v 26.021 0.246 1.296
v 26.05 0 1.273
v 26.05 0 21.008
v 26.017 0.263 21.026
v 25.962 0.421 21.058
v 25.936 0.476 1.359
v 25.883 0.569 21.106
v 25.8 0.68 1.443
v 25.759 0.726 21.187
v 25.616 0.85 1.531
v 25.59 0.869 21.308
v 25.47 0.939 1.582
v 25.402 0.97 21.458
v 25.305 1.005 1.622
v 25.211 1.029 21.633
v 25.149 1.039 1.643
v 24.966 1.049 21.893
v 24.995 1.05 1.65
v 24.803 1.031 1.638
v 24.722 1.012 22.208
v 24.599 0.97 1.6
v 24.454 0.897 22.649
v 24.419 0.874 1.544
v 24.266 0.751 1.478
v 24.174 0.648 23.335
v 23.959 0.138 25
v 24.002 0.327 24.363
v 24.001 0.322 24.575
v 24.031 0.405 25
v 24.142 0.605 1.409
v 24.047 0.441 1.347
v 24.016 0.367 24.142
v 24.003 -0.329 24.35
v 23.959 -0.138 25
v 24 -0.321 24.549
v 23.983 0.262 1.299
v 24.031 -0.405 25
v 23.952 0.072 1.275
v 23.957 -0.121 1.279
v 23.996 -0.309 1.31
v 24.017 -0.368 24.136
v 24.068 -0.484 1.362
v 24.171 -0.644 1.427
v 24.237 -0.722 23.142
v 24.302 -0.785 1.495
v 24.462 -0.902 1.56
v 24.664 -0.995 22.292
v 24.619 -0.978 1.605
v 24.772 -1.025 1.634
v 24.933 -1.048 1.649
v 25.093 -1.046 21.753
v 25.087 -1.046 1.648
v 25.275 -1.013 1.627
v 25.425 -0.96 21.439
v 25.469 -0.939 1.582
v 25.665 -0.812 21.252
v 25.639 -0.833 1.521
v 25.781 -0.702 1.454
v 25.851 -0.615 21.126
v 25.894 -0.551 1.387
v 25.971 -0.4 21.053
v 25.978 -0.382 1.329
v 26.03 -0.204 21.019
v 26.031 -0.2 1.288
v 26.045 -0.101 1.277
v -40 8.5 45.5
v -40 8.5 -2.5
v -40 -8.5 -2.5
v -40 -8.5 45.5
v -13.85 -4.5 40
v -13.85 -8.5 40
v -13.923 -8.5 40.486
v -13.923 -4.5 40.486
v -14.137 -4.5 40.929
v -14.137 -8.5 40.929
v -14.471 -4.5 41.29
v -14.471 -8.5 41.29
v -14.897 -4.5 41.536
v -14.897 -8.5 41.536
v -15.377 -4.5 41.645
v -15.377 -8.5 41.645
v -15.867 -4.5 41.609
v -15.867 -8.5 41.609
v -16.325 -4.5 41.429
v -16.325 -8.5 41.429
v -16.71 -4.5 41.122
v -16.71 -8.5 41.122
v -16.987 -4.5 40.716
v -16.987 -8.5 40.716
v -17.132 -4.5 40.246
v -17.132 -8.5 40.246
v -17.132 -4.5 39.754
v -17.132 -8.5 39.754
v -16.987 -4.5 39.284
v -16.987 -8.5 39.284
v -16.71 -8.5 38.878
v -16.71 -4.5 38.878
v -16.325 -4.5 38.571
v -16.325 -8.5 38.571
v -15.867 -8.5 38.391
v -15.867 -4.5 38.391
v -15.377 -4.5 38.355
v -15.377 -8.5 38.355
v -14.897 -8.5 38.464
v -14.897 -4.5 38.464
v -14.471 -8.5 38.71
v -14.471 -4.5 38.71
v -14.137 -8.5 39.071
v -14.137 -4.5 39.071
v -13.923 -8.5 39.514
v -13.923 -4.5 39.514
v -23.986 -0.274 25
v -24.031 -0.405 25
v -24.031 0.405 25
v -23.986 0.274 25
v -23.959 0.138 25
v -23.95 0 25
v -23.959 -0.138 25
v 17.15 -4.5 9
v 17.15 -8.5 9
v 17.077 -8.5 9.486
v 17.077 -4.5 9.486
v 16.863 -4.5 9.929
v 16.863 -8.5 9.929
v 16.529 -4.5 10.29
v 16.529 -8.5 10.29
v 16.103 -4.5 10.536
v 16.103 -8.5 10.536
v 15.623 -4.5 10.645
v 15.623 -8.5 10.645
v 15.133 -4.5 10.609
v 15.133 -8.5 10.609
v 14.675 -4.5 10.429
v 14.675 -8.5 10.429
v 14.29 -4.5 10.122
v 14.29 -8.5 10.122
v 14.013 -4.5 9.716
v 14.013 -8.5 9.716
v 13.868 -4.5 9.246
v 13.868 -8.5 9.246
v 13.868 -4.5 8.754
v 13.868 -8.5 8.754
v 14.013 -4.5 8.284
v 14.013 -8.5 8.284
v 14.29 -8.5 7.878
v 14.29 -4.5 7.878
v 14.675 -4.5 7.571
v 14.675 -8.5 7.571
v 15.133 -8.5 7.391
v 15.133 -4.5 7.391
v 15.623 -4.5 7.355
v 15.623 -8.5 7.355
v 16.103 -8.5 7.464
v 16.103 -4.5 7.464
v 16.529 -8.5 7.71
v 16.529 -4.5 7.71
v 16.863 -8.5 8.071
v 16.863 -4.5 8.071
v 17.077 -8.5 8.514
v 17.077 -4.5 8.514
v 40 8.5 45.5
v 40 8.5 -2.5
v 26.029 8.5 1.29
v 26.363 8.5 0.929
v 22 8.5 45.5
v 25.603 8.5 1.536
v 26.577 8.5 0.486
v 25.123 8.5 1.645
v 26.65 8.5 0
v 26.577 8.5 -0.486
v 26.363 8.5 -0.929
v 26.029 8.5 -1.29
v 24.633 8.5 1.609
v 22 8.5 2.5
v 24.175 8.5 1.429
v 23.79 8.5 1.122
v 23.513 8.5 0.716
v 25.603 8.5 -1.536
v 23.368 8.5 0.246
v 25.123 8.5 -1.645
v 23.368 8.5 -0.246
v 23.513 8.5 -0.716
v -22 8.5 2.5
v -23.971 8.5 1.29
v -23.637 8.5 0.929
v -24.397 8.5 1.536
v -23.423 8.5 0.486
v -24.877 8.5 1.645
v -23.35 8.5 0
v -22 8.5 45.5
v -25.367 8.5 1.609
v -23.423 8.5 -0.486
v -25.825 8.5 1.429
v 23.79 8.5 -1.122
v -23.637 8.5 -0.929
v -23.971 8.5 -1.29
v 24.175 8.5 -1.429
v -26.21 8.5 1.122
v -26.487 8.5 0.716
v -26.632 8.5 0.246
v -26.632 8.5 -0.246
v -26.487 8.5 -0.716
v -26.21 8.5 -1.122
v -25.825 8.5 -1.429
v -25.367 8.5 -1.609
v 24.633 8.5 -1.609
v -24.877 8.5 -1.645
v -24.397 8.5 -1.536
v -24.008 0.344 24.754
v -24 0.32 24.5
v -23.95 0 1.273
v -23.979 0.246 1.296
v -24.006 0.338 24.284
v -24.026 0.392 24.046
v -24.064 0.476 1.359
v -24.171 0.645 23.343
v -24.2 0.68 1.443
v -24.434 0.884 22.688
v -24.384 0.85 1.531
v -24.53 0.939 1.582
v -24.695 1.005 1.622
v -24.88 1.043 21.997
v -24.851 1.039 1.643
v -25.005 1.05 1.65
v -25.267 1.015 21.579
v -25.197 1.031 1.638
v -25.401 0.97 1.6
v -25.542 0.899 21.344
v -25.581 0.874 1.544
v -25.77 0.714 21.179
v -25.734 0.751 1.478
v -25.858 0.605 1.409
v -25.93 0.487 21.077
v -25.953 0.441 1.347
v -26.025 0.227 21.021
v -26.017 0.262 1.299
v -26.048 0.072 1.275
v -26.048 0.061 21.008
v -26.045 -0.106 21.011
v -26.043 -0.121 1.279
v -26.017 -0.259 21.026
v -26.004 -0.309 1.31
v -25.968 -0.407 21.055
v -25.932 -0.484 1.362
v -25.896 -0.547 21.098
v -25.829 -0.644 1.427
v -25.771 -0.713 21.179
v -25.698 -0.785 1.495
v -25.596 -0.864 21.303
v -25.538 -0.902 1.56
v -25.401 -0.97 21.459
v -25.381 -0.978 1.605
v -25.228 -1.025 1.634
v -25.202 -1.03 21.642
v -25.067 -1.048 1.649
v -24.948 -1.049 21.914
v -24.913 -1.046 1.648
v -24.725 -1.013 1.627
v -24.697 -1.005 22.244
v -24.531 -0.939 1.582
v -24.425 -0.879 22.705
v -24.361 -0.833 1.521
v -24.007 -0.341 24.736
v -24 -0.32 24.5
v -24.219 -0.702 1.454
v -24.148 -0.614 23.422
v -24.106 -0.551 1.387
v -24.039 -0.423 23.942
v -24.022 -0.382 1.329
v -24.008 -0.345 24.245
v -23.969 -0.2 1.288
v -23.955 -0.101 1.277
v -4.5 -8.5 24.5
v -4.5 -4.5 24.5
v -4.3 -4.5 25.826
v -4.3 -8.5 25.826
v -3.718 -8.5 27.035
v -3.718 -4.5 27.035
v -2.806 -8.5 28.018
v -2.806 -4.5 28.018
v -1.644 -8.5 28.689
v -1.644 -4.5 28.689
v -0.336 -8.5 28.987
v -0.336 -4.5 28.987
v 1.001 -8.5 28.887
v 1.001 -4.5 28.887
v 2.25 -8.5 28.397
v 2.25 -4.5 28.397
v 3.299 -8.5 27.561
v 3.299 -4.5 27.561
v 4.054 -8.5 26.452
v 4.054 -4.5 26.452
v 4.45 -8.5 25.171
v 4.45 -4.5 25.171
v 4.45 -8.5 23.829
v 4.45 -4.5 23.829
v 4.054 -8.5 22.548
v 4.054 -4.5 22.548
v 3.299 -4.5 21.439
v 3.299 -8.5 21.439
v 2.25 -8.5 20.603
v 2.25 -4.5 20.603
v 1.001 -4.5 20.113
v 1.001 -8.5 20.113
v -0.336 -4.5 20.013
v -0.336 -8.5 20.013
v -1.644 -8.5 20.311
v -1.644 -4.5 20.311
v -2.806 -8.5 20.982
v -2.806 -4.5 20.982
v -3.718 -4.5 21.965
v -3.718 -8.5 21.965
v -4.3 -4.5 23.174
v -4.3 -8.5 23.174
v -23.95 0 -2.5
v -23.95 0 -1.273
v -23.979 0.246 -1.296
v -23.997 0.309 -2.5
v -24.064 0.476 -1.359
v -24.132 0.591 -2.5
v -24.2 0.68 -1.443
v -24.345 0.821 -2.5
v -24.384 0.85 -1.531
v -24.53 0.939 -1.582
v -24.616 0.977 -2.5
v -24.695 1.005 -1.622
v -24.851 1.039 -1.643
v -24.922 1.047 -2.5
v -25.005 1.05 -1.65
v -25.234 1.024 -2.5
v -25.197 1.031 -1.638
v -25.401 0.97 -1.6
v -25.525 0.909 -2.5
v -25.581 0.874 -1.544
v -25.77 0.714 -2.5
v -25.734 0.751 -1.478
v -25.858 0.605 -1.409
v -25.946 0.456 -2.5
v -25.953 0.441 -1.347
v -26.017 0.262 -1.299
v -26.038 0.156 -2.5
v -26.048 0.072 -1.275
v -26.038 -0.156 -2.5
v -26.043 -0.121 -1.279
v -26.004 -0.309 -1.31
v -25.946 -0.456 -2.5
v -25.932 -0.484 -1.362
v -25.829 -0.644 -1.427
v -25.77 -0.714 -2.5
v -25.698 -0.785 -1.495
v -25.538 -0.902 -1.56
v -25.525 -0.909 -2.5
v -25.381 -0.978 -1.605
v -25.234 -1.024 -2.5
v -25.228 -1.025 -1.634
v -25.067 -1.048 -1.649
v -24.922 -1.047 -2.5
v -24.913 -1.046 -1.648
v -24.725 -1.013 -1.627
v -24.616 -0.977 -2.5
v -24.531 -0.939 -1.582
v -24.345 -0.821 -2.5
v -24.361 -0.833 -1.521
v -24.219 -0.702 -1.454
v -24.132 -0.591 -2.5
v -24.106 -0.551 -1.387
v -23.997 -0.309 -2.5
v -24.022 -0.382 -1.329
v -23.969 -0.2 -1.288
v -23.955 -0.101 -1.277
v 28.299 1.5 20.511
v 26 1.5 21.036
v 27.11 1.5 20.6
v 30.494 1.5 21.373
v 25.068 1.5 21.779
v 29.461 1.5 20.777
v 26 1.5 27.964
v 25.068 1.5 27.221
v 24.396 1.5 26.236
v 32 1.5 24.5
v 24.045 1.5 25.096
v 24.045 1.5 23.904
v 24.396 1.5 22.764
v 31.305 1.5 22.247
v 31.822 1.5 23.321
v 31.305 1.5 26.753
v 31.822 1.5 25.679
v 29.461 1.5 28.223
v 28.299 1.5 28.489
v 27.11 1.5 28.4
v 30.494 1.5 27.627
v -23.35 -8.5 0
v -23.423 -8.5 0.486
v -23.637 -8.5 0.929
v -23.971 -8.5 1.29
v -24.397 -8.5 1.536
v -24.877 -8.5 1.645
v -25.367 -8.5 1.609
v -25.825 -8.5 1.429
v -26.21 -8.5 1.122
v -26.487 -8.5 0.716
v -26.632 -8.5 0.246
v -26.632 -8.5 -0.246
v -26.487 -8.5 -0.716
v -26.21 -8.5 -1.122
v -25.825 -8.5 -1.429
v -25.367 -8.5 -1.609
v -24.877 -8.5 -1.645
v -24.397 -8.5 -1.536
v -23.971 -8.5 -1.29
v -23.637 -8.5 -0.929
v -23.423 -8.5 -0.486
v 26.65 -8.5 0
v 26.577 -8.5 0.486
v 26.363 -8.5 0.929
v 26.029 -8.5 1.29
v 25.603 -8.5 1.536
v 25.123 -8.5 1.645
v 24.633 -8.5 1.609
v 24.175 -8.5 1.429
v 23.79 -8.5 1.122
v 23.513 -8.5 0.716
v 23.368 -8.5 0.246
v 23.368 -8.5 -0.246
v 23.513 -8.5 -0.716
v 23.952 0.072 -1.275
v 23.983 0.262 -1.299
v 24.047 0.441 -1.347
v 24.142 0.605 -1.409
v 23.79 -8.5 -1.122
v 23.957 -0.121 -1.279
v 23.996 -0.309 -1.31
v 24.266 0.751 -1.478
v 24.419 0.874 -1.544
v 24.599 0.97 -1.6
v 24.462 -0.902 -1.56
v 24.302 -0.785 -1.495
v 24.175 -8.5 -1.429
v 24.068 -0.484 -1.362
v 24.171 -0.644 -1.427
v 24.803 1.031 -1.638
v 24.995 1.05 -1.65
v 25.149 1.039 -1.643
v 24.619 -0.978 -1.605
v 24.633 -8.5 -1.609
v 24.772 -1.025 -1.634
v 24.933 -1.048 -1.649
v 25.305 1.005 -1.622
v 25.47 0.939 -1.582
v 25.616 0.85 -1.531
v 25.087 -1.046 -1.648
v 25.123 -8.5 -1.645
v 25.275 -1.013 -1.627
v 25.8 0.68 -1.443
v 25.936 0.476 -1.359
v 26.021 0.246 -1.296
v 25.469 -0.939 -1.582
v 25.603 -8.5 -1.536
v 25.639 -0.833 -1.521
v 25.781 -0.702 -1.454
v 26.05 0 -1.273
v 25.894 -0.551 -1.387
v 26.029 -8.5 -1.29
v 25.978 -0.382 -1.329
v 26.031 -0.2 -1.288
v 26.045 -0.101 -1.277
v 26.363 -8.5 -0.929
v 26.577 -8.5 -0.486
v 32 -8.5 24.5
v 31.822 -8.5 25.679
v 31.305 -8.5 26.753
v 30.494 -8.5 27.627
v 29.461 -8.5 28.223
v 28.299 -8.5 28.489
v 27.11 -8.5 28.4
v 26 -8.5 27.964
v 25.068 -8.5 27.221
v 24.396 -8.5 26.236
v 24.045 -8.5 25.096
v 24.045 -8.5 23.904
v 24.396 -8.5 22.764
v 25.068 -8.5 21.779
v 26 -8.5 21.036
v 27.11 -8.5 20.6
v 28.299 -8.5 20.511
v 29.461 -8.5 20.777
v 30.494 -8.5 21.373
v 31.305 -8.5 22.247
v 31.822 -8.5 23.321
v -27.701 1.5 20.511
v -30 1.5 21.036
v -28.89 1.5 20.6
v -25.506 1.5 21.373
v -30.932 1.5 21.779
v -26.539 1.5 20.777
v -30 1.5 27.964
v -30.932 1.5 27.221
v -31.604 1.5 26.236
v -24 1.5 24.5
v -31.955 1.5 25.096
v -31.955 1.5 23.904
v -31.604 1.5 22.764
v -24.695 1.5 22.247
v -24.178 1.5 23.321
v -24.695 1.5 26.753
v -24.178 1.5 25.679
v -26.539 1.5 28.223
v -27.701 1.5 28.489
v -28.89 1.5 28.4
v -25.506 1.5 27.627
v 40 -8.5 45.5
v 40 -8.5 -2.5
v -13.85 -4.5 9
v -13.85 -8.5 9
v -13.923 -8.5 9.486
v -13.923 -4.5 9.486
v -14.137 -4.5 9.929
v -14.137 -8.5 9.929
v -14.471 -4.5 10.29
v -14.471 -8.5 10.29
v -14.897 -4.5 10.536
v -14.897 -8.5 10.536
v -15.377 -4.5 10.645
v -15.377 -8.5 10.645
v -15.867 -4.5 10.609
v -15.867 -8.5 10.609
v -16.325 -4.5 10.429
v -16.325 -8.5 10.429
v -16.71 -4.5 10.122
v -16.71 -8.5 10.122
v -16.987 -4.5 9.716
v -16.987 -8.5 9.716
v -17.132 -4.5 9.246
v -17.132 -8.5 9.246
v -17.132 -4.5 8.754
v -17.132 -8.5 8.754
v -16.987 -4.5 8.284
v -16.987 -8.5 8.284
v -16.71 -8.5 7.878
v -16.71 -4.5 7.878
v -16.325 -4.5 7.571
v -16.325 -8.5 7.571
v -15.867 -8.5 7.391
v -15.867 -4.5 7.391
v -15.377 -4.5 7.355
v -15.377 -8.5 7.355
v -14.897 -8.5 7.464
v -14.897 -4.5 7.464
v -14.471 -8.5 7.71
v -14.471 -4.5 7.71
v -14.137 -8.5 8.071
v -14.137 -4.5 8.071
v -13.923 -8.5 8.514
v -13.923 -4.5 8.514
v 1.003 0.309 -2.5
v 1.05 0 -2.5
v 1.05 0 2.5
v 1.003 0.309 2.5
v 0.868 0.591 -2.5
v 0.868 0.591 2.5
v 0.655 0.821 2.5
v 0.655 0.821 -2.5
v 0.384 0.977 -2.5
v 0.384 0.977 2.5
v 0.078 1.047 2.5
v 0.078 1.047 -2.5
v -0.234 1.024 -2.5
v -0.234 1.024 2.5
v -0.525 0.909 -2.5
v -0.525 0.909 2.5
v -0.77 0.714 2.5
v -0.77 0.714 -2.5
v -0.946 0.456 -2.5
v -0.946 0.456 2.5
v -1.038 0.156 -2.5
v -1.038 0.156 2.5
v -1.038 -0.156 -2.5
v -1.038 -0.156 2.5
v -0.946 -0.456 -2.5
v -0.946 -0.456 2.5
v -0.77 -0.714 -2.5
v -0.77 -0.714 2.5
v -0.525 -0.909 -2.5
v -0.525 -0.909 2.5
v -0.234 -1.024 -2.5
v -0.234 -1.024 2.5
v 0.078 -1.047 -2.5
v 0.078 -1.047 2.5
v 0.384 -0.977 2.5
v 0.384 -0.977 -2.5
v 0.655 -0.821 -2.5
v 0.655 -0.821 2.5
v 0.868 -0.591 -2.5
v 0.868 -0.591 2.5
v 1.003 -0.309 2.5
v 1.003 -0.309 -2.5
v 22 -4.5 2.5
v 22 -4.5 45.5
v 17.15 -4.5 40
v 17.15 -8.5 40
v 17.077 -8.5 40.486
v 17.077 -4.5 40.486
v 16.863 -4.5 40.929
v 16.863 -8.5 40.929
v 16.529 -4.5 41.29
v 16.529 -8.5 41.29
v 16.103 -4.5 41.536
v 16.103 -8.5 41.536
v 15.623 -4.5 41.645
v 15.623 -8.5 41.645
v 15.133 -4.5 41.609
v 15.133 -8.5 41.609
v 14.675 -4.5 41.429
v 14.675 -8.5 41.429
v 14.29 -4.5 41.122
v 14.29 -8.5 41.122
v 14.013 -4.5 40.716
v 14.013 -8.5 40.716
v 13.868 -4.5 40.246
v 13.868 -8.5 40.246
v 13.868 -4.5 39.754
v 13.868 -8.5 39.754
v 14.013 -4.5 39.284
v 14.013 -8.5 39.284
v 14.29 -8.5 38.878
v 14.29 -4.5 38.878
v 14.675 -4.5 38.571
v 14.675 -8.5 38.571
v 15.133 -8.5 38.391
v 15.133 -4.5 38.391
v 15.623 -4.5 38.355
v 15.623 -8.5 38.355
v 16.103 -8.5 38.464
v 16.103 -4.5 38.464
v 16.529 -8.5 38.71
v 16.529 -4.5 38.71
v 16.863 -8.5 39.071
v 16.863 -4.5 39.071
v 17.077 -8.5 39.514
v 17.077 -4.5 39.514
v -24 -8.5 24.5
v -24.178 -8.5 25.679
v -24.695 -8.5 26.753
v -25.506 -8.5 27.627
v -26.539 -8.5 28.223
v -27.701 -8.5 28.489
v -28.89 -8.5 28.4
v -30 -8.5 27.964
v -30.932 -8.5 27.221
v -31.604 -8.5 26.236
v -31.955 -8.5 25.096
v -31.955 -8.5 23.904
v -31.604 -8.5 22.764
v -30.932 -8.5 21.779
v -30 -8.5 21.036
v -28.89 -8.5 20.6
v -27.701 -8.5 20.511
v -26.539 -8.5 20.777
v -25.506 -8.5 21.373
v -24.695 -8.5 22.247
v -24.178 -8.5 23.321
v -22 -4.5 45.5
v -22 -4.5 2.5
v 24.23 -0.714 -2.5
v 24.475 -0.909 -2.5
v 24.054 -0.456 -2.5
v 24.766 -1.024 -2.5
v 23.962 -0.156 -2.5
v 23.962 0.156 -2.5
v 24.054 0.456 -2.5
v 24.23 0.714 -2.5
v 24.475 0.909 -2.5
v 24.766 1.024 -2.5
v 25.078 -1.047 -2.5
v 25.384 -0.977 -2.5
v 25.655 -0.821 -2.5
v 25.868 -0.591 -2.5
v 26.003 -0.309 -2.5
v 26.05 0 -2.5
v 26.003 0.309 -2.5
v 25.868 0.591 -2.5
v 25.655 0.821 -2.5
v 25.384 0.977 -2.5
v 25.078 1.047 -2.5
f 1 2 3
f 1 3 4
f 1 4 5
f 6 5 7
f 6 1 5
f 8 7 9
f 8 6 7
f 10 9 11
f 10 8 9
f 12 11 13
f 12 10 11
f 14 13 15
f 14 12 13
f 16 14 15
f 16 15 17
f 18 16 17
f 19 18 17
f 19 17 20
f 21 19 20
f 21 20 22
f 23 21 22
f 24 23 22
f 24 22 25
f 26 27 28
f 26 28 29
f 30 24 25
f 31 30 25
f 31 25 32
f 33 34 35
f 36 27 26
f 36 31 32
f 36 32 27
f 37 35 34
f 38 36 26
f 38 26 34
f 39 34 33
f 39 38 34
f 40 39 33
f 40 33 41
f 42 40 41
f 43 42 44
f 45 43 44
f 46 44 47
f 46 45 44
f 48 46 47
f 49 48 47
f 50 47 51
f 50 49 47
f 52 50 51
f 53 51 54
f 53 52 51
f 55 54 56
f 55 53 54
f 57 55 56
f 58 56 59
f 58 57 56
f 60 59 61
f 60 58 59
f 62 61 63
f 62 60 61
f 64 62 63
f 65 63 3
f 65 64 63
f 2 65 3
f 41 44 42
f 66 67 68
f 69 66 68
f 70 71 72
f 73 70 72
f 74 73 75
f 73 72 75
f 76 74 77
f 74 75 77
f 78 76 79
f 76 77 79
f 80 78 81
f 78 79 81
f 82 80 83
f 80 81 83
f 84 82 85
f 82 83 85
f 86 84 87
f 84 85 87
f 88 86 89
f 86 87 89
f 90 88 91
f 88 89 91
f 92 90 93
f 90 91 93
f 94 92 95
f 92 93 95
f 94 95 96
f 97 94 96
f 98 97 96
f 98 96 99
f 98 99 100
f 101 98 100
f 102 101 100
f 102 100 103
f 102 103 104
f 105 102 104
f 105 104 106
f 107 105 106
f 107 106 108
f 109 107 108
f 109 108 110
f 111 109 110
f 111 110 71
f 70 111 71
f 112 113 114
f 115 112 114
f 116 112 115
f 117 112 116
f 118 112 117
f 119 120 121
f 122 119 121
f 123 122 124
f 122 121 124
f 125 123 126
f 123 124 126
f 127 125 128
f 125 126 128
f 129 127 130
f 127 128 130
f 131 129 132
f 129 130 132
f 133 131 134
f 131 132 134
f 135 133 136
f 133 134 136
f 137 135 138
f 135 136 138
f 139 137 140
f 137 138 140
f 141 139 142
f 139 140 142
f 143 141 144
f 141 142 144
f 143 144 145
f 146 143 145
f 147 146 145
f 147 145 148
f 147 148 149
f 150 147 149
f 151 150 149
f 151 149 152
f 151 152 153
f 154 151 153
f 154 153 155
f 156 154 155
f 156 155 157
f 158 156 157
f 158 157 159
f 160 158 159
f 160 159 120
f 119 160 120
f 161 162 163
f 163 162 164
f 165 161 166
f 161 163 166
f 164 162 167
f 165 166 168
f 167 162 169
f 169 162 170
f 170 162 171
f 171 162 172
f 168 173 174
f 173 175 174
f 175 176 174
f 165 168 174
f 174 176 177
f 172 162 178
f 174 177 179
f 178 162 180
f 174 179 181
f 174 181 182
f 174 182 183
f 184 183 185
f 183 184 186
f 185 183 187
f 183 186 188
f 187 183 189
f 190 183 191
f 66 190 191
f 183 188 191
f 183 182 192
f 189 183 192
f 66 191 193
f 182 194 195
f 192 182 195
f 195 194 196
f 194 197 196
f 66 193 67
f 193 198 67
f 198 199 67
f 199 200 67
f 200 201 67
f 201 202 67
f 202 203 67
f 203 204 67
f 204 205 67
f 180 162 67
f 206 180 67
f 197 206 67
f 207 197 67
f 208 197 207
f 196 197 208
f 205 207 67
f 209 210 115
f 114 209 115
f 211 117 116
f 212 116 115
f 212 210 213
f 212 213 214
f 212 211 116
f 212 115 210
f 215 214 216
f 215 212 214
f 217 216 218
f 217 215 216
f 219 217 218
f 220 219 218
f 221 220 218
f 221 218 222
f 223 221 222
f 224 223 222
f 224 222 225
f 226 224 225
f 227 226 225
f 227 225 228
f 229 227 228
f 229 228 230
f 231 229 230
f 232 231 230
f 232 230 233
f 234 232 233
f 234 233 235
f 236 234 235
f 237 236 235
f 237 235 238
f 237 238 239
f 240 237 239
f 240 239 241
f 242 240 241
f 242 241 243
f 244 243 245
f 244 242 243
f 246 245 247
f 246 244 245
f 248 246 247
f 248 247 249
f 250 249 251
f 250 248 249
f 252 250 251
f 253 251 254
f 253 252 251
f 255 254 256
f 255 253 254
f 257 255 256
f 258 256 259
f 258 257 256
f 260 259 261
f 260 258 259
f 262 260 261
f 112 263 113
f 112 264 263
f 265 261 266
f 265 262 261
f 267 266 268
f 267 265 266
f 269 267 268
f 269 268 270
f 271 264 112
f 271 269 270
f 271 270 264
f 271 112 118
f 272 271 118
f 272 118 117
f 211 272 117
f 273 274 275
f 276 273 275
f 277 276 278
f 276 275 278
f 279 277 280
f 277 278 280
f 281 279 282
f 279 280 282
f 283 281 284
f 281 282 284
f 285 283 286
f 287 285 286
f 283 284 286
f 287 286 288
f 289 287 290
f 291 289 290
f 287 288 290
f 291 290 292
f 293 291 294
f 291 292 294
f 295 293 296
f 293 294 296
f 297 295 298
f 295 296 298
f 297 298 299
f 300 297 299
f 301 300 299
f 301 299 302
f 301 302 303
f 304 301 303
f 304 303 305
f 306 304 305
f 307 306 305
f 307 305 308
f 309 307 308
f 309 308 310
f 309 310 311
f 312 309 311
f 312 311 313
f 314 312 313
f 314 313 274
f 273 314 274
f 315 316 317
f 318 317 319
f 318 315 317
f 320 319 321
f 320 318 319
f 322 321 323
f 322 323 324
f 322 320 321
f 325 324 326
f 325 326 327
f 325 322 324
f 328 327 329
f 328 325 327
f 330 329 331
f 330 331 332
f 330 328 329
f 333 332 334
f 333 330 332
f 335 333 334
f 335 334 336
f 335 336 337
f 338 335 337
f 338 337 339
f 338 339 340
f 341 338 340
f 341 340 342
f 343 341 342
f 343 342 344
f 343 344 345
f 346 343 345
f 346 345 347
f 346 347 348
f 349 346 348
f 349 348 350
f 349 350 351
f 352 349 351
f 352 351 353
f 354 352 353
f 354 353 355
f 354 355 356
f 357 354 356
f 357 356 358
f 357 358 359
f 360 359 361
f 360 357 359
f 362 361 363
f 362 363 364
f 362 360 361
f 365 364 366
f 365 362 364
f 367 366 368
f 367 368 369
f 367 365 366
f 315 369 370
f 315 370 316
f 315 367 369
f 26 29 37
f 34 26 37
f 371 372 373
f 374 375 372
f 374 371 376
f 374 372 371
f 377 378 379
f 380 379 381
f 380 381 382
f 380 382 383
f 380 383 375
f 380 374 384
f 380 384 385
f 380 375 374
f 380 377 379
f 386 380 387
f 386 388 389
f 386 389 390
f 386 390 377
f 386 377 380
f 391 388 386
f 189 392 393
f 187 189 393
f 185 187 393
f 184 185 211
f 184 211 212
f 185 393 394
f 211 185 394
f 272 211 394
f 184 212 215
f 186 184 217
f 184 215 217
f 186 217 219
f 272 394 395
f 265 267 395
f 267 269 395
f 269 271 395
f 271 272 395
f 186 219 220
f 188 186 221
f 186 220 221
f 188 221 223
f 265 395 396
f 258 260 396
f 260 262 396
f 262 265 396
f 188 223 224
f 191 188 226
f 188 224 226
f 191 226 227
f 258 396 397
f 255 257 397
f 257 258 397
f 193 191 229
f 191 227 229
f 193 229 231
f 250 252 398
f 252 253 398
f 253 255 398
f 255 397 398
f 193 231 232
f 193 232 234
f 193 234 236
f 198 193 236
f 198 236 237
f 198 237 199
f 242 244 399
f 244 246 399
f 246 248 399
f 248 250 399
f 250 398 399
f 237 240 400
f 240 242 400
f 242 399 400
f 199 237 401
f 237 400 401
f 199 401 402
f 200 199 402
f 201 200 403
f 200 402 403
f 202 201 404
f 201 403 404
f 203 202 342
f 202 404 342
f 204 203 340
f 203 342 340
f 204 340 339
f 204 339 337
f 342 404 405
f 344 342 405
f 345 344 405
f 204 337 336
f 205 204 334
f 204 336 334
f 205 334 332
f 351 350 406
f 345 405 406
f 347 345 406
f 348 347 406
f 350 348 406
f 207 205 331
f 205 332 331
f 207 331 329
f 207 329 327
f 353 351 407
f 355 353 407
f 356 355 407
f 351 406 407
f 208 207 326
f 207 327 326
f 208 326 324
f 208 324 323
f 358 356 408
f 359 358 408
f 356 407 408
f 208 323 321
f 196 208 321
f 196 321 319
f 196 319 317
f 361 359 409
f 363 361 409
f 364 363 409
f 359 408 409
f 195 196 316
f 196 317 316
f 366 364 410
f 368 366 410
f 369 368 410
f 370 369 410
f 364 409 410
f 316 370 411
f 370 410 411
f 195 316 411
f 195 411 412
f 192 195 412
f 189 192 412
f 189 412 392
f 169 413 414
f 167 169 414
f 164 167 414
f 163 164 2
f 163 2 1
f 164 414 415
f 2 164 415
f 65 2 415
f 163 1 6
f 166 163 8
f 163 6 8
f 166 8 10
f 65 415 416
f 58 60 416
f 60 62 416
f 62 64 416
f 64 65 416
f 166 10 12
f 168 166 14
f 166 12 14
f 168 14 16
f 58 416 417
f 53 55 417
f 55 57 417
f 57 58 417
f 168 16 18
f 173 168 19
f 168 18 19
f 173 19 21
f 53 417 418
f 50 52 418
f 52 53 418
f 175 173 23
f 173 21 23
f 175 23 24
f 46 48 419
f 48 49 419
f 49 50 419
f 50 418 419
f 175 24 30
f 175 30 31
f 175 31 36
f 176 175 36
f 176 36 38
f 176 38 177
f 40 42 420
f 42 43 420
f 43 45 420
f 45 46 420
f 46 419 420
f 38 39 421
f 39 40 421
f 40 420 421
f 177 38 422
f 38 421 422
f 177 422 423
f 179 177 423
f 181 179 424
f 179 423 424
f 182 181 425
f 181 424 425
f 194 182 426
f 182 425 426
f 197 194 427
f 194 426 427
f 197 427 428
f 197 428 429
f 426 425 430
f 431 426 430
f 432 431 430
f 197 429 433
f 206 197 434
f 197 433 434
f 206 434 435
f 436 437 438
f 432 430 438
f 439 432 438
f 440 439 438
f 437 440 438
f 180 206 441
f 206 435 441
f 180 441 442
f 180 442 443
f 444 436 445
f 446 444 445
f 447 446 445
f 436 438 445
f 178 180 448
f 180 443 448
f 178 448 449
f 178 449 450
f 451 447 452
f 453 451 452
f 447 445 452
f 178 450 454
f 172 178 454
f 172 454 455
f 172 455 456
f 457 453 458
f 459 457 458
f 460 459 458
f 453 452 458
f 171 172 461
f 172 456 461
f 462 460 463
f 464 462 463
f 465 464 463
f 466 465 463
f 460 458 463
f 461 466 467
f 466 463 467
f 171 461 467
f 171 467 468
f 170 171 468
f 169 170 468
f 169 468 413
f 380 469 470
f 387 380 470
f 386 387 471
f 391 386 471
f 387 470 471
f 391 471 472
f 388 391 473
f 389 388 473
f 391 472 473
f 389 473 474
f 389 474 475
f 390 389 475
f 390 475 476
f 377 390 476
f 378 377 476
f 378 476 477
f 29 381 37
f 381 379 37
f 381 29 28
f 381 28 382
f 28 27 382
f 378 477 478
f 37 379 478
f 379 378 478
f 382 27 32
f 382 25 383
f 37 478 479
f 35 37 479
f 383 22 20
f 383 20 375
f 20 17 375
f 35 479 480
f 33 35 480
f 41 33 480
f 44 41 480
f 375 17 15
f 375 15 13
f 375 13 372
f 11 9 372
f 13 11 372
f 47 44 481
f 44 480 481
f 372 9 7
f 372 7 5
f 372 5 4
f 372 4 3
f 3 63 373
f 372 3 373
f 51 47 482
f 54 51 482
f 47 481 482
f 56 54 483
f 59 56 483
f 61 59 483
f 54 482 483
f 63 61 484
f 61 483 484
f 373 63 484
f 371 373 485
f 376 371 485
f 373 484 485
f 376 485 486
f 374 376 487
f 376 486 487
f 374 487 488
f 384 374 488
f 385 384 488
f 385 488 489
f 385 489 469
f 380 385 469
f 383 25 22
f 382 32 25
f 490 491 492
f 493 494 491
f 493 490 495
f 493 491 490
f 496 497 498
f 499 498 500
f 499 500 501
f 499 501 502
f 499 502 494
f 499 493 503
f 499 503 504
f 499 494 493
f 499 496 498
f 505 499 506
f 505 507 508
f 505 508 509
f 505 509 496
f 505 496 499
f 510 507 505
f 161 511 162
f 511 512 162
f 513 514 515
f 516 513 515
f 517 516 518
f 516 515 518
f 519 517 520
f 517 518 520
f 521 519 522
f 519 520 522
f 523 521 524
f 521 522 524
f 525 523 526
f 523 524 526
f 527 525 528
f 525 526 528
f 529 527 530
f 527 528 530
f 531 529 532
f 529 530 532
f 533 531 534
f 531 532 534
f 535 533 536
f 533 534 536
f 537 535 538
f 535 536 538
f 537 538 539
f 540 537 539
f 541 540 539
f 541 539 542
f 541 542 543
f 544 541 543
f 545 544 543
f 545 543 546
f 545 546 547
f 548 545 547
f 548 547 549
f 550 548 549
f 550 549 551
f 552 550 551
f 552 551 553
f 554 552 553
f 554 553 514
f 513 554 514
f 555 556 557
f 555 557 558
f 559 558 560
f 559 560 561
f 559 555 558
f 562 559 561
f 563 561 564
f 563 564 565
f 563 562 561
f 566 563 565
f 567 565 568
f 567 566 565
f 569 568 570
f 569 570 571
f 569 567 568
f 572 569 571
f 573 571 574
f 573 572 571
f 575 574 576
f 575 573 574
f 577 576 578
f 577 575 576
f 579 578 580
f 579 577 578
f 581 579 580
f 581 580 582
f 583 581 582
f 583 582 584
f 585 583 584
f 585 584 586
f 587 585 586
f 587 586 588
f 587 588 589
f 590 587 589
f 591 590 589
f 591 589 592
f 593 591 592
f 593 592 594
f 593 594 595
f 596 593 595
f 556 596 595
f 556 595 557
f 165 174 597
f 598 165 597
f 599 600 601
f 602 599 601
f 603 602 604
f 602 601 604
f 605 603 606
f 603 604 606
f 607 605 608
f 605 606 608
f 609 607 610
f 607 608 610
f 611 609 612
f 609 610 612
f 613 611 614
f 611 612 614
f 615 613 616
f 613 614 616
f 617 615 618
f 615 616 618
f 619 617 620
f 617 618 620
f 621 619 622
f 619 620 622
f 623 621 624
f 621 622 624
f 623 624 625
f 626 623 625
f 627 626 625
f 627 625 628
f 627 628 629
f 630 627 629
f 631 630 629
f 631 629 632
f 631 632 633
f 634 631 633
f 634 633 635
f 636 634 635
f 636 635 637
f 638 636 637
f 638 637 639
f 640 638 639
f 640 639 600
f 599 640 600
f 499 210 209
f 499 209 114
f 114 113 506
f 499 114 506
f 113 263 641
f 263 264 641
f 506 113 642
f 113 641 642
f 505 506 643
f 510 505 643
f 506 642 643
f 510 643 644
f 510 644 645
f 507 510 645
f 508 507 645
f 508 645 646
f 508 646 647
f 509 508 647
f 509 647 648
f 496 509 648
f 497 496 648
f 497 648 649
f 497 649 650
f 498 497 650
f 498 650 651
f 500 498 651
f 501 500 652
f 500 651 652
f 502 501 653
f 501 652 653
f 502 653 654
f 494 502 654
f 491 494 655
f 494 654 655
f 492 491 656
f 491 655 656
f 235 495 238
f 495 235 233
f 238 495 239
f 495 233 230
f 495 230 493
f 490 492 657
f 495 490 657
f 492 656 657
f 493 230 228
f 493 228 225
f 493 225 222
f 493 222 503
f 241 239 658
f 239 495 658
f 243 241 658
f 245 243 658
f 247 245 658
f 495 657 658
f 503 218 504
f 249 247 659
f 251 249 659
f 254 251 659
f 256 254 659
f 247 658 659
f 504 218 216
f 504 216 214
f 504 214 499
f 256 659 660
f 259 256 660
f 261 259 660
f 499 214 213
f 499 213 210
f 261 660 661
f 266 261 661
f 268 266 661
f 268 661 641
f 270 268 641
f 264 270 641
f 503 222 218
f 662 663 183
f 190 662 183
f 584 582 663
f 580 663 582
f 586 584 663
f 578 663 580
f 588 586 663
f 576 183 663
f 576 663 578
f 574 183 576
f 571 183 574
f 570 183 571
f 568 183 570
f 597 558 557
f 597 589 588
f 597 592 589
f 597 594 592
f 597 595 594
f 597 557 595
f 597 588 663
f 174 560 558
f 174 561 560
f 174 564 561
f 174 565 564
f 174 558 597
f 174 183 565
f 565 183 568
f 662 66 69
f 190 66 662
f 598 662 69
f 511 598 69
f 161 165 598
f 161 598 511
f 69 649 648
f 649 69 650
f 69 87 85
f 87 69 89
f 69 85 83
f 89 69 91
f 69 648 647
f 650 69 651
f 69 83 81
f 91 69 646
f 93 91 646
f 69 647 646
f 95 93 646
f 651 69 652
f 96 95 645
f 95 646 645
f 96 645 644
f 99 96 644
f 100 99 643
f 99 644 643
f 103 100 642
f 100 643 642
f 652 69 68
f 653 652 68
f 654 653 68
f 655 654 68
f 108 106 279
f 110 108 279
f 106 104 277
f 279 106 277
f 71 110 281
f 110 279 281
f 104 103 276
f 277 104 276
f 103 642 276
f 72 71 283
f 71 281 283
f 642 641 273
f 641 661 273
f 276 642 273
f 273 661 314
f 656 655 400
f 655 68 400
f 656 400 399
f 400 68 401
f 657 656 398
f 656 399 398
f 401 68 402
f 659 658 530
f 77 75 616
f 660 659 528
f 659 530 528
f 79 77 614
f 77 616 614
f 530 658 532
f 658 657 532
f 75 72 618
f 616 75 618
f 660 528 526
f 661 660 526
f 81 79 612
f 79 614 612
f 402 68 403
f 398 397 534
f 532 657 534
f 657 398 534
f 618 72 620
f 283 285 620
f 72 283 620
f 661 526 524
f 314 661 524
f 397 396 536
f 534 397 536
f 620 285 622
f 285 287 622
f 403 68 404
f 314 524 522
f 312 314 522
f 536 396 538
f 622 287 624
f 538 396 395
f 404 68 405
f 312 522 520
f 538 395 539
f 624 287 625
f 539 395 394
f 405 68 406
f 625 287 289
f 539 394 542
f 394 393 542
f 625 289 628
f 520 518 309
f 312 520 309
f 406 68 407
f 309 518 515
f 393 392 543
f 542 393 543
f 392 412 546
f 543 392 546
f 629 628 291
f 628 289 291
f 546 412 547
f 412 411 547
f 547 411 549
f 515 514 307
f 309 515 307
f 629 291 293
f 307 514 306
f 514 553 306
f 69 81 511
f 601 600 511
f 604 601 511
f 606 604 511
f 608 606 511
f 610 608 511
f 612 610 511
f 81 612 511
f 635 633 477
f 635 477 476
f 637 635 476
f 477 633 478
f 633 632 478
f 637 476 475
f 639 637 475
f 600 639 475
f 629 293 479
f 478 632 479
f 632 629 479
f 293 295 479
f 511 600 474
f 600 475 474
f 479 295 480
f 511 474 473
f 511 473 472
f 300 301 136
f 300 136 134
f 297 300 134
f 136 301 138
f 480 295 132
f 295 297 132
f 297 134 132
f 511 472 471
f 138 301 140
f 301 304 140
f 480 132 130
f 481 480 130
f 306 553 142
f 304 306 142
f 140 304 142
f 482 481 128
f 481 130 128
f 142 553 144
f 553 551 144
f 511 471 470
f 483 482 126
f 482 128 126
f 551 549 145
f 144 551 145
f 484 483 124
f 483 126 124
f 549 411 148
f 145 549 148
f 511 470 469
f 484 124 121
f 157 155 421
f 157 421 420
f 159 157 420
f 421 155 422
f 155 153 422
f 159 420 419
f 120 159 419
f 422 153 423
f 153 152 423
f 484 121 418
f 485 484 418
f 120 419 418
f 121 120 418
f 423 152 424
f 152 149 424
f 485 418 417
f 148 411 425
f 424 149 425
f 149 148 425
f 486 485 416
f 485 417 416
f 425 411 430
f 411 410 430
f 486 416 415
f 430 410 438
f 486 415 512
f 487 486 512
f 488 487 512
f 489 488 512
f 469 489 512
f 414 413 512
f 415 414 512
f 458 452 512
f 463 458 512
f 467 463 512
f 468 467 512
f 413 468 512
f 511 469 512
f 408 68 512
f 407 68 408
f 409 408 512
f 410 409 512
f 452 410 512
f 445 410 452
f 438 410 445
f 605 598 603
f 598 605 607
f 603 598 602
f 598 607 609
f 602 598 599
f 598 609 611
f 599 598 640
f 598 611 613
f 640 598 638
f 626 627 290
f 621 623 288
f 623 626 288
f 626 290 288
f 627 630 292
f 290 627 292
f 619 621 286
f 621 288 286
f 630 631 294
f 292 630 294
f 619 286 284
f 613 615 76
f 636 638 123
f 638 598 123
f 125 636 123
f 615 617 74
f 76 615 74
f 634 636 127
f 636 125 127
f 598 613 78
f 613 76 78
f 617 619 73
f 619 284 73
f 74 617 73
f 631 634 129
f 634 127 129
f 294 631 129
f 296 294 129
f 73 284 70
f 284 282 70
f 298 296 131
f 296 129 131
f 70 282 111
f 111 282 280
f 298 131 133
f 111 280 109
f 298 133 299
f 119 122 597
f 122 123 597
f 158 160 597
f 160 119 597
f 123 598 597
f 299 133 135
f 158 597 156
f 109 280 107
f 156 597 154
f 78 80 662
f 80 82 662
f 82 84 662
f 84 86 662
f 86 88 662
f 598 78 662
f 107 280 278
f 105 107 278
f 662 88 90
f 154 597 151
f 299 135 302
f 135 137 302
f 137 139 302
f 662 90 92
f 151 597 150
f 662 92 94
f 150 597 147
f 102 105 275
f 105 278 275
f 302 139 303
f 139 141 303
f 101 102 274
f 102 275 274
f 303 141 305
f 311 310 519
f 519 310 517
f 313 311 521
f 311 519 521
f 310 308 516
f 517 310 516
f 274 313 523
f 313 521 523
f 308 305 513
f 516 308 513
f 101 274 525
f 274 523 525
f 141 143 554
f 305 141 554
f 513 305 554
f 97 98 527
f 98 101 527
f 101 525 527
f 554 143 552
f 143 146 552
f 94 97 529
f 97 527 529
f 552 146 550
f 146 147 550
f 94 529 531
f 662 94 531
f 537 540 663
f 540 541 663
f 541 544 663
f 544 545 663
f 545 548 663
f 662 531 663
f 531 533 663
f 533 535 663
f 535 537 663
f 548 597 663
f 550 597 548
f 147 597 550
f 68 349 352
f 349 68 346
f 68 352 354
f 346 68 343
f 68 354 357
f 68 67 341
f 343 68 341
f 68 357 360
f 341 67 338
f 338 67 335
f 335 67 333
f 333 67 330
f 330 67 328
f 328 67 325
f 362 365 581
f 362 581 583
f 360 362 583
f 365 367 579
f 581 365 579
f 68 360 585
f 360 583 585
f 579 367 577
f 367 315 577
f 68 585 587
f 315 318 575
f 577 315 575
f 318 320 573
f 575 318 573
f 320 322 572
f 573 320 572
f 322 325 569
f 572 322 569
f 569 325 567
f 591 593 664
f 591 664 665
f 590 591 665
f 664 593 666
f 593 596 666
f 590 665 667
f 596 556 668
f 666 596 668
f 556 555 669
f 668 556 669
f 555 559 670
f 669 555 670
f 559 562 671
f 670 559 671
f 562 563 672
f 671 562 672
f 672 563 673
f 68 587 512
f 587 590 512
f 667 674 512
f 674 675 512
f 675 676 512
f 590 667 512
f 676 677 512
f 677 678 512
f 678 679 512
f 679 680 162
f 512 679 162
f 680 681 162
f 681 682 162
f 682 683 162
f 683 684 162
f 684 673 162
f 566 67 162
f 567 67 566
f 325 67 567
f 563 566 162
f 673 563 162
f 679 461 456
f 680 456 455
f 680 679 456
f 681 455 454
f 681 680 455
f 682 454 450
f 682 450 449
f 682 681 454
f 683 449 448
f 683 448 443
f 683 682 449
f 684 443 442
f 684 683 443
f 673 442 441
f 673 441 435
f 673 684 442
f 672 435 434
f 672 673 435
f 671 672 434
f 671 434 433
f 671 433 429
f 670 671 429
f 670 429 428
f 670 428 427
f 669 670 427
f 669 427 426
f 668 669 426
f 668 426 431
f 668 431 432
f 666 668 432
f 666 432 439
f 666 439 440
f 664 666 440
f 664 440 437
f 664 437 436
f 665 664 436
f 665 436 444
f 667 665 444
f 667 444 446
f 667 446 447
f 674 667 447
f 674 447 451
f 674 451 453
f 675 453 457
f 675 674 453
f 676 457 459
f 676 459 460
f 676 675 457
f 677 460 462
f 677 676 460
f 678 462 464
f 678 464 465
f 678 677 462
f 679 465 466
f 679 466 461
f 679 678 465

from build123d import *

# Parameters (mm, degrees)
F0_W      = 80
F0_H      = 17
F0_R      = 1.05
F1_DEPTH  = 2.5
F3_DEPTH  = 43
F5_DEPTH  = 25
F7_D      = 3.3
F8_D      = 3.3
F4_R      = 4.5
F9_DEPTH  = 4.0010001
F10_R     = 4
F11_DEPTH = 10


# Not quite as in the source:
# - a feature names something its author has since deleted; it is built from what else it names


with BuildPart() as f1:
    # F0 (on Top) → F1 (new body, symmetric)
    with BuildSketch(Plane.XY):
        Rectangle(F0_W, F0_H)
        with Locations((-25, 0)):
            Circle(F0_R, mode=Mode.SUBTRACT)
        Circle(F0_R, mode=Mode.SUBTRACT)
        with Locations((25, 0)):
            Circle(F0_R, mode=Mode.SUBTRACT)
    extrude(amount=F1_DEPTH, both=True)

    # F2 (on face) → F3 (join)
    with BuildSketch(Plane.XY.offset(2.5)):
        Polygon((-40, -8.5), (40, -8.5), (40, 8.5), (22, 8.5), (22, -4.5), (-22, -4.5), (-22, 8.5), (-40, 8.5), align=None)
    extrude(amount=F3_DEPTH)

    # F0 (on Top) → F5 (cut)
    with BuildSketch(Plane.XY):
        with Locations((-25, 0)):
            Circle(F0_R)
        Circle(F0_R)
        with Locations((25, 0)):
            Circle(F0_R)
    extrude(amount=F5_DEPTH, mode=Mode.SUBTRACT)

    # F7 (through all)
    with Locations(Plane(origin=(0, 8.5, 0), x_dir=(-1, 0, 0), z_dir=(0, 1, 0))):
        with Locations((25, 0), (-25, 0)):
            Hole(F7_D / 2)

    # F8 (through all)
    with Locations(Plane(origin=(0, -4.5, 0), x_dir=(-1, 0, 0), z_dir=(0, 1, 0))):
        with Locations((15.5, 40), (-15.5, 40), (-15.5, 9), (15.5, 9)):
            Hole(F8_D / 2)

    # F4 (on face) → F9 (cut, through all)
    with BuildSketch(Plane(origin=(0, -4.5, 0), x_dir=(-1, 0, 0), z_dir=(0, 1, 0))):
        with Locations((0, 24.5)):
            Circle(F4_R)
    extrude(amount=-F9_DEPTH, mode=Mode.SUBTRACT)

    # F10 (on face) → F11 (cut)
    with BuildSketch(Plane.XZ.offset(8.5)):
        with Locations((-28, 24.5)):
            Circle(F10_R)
        with Locations((28, 24.5)):
            Circle(F10_R)
    extrude(amount=-F11_DEPTH, mode=Mode.SUBTRACT)


solid = f1.part
